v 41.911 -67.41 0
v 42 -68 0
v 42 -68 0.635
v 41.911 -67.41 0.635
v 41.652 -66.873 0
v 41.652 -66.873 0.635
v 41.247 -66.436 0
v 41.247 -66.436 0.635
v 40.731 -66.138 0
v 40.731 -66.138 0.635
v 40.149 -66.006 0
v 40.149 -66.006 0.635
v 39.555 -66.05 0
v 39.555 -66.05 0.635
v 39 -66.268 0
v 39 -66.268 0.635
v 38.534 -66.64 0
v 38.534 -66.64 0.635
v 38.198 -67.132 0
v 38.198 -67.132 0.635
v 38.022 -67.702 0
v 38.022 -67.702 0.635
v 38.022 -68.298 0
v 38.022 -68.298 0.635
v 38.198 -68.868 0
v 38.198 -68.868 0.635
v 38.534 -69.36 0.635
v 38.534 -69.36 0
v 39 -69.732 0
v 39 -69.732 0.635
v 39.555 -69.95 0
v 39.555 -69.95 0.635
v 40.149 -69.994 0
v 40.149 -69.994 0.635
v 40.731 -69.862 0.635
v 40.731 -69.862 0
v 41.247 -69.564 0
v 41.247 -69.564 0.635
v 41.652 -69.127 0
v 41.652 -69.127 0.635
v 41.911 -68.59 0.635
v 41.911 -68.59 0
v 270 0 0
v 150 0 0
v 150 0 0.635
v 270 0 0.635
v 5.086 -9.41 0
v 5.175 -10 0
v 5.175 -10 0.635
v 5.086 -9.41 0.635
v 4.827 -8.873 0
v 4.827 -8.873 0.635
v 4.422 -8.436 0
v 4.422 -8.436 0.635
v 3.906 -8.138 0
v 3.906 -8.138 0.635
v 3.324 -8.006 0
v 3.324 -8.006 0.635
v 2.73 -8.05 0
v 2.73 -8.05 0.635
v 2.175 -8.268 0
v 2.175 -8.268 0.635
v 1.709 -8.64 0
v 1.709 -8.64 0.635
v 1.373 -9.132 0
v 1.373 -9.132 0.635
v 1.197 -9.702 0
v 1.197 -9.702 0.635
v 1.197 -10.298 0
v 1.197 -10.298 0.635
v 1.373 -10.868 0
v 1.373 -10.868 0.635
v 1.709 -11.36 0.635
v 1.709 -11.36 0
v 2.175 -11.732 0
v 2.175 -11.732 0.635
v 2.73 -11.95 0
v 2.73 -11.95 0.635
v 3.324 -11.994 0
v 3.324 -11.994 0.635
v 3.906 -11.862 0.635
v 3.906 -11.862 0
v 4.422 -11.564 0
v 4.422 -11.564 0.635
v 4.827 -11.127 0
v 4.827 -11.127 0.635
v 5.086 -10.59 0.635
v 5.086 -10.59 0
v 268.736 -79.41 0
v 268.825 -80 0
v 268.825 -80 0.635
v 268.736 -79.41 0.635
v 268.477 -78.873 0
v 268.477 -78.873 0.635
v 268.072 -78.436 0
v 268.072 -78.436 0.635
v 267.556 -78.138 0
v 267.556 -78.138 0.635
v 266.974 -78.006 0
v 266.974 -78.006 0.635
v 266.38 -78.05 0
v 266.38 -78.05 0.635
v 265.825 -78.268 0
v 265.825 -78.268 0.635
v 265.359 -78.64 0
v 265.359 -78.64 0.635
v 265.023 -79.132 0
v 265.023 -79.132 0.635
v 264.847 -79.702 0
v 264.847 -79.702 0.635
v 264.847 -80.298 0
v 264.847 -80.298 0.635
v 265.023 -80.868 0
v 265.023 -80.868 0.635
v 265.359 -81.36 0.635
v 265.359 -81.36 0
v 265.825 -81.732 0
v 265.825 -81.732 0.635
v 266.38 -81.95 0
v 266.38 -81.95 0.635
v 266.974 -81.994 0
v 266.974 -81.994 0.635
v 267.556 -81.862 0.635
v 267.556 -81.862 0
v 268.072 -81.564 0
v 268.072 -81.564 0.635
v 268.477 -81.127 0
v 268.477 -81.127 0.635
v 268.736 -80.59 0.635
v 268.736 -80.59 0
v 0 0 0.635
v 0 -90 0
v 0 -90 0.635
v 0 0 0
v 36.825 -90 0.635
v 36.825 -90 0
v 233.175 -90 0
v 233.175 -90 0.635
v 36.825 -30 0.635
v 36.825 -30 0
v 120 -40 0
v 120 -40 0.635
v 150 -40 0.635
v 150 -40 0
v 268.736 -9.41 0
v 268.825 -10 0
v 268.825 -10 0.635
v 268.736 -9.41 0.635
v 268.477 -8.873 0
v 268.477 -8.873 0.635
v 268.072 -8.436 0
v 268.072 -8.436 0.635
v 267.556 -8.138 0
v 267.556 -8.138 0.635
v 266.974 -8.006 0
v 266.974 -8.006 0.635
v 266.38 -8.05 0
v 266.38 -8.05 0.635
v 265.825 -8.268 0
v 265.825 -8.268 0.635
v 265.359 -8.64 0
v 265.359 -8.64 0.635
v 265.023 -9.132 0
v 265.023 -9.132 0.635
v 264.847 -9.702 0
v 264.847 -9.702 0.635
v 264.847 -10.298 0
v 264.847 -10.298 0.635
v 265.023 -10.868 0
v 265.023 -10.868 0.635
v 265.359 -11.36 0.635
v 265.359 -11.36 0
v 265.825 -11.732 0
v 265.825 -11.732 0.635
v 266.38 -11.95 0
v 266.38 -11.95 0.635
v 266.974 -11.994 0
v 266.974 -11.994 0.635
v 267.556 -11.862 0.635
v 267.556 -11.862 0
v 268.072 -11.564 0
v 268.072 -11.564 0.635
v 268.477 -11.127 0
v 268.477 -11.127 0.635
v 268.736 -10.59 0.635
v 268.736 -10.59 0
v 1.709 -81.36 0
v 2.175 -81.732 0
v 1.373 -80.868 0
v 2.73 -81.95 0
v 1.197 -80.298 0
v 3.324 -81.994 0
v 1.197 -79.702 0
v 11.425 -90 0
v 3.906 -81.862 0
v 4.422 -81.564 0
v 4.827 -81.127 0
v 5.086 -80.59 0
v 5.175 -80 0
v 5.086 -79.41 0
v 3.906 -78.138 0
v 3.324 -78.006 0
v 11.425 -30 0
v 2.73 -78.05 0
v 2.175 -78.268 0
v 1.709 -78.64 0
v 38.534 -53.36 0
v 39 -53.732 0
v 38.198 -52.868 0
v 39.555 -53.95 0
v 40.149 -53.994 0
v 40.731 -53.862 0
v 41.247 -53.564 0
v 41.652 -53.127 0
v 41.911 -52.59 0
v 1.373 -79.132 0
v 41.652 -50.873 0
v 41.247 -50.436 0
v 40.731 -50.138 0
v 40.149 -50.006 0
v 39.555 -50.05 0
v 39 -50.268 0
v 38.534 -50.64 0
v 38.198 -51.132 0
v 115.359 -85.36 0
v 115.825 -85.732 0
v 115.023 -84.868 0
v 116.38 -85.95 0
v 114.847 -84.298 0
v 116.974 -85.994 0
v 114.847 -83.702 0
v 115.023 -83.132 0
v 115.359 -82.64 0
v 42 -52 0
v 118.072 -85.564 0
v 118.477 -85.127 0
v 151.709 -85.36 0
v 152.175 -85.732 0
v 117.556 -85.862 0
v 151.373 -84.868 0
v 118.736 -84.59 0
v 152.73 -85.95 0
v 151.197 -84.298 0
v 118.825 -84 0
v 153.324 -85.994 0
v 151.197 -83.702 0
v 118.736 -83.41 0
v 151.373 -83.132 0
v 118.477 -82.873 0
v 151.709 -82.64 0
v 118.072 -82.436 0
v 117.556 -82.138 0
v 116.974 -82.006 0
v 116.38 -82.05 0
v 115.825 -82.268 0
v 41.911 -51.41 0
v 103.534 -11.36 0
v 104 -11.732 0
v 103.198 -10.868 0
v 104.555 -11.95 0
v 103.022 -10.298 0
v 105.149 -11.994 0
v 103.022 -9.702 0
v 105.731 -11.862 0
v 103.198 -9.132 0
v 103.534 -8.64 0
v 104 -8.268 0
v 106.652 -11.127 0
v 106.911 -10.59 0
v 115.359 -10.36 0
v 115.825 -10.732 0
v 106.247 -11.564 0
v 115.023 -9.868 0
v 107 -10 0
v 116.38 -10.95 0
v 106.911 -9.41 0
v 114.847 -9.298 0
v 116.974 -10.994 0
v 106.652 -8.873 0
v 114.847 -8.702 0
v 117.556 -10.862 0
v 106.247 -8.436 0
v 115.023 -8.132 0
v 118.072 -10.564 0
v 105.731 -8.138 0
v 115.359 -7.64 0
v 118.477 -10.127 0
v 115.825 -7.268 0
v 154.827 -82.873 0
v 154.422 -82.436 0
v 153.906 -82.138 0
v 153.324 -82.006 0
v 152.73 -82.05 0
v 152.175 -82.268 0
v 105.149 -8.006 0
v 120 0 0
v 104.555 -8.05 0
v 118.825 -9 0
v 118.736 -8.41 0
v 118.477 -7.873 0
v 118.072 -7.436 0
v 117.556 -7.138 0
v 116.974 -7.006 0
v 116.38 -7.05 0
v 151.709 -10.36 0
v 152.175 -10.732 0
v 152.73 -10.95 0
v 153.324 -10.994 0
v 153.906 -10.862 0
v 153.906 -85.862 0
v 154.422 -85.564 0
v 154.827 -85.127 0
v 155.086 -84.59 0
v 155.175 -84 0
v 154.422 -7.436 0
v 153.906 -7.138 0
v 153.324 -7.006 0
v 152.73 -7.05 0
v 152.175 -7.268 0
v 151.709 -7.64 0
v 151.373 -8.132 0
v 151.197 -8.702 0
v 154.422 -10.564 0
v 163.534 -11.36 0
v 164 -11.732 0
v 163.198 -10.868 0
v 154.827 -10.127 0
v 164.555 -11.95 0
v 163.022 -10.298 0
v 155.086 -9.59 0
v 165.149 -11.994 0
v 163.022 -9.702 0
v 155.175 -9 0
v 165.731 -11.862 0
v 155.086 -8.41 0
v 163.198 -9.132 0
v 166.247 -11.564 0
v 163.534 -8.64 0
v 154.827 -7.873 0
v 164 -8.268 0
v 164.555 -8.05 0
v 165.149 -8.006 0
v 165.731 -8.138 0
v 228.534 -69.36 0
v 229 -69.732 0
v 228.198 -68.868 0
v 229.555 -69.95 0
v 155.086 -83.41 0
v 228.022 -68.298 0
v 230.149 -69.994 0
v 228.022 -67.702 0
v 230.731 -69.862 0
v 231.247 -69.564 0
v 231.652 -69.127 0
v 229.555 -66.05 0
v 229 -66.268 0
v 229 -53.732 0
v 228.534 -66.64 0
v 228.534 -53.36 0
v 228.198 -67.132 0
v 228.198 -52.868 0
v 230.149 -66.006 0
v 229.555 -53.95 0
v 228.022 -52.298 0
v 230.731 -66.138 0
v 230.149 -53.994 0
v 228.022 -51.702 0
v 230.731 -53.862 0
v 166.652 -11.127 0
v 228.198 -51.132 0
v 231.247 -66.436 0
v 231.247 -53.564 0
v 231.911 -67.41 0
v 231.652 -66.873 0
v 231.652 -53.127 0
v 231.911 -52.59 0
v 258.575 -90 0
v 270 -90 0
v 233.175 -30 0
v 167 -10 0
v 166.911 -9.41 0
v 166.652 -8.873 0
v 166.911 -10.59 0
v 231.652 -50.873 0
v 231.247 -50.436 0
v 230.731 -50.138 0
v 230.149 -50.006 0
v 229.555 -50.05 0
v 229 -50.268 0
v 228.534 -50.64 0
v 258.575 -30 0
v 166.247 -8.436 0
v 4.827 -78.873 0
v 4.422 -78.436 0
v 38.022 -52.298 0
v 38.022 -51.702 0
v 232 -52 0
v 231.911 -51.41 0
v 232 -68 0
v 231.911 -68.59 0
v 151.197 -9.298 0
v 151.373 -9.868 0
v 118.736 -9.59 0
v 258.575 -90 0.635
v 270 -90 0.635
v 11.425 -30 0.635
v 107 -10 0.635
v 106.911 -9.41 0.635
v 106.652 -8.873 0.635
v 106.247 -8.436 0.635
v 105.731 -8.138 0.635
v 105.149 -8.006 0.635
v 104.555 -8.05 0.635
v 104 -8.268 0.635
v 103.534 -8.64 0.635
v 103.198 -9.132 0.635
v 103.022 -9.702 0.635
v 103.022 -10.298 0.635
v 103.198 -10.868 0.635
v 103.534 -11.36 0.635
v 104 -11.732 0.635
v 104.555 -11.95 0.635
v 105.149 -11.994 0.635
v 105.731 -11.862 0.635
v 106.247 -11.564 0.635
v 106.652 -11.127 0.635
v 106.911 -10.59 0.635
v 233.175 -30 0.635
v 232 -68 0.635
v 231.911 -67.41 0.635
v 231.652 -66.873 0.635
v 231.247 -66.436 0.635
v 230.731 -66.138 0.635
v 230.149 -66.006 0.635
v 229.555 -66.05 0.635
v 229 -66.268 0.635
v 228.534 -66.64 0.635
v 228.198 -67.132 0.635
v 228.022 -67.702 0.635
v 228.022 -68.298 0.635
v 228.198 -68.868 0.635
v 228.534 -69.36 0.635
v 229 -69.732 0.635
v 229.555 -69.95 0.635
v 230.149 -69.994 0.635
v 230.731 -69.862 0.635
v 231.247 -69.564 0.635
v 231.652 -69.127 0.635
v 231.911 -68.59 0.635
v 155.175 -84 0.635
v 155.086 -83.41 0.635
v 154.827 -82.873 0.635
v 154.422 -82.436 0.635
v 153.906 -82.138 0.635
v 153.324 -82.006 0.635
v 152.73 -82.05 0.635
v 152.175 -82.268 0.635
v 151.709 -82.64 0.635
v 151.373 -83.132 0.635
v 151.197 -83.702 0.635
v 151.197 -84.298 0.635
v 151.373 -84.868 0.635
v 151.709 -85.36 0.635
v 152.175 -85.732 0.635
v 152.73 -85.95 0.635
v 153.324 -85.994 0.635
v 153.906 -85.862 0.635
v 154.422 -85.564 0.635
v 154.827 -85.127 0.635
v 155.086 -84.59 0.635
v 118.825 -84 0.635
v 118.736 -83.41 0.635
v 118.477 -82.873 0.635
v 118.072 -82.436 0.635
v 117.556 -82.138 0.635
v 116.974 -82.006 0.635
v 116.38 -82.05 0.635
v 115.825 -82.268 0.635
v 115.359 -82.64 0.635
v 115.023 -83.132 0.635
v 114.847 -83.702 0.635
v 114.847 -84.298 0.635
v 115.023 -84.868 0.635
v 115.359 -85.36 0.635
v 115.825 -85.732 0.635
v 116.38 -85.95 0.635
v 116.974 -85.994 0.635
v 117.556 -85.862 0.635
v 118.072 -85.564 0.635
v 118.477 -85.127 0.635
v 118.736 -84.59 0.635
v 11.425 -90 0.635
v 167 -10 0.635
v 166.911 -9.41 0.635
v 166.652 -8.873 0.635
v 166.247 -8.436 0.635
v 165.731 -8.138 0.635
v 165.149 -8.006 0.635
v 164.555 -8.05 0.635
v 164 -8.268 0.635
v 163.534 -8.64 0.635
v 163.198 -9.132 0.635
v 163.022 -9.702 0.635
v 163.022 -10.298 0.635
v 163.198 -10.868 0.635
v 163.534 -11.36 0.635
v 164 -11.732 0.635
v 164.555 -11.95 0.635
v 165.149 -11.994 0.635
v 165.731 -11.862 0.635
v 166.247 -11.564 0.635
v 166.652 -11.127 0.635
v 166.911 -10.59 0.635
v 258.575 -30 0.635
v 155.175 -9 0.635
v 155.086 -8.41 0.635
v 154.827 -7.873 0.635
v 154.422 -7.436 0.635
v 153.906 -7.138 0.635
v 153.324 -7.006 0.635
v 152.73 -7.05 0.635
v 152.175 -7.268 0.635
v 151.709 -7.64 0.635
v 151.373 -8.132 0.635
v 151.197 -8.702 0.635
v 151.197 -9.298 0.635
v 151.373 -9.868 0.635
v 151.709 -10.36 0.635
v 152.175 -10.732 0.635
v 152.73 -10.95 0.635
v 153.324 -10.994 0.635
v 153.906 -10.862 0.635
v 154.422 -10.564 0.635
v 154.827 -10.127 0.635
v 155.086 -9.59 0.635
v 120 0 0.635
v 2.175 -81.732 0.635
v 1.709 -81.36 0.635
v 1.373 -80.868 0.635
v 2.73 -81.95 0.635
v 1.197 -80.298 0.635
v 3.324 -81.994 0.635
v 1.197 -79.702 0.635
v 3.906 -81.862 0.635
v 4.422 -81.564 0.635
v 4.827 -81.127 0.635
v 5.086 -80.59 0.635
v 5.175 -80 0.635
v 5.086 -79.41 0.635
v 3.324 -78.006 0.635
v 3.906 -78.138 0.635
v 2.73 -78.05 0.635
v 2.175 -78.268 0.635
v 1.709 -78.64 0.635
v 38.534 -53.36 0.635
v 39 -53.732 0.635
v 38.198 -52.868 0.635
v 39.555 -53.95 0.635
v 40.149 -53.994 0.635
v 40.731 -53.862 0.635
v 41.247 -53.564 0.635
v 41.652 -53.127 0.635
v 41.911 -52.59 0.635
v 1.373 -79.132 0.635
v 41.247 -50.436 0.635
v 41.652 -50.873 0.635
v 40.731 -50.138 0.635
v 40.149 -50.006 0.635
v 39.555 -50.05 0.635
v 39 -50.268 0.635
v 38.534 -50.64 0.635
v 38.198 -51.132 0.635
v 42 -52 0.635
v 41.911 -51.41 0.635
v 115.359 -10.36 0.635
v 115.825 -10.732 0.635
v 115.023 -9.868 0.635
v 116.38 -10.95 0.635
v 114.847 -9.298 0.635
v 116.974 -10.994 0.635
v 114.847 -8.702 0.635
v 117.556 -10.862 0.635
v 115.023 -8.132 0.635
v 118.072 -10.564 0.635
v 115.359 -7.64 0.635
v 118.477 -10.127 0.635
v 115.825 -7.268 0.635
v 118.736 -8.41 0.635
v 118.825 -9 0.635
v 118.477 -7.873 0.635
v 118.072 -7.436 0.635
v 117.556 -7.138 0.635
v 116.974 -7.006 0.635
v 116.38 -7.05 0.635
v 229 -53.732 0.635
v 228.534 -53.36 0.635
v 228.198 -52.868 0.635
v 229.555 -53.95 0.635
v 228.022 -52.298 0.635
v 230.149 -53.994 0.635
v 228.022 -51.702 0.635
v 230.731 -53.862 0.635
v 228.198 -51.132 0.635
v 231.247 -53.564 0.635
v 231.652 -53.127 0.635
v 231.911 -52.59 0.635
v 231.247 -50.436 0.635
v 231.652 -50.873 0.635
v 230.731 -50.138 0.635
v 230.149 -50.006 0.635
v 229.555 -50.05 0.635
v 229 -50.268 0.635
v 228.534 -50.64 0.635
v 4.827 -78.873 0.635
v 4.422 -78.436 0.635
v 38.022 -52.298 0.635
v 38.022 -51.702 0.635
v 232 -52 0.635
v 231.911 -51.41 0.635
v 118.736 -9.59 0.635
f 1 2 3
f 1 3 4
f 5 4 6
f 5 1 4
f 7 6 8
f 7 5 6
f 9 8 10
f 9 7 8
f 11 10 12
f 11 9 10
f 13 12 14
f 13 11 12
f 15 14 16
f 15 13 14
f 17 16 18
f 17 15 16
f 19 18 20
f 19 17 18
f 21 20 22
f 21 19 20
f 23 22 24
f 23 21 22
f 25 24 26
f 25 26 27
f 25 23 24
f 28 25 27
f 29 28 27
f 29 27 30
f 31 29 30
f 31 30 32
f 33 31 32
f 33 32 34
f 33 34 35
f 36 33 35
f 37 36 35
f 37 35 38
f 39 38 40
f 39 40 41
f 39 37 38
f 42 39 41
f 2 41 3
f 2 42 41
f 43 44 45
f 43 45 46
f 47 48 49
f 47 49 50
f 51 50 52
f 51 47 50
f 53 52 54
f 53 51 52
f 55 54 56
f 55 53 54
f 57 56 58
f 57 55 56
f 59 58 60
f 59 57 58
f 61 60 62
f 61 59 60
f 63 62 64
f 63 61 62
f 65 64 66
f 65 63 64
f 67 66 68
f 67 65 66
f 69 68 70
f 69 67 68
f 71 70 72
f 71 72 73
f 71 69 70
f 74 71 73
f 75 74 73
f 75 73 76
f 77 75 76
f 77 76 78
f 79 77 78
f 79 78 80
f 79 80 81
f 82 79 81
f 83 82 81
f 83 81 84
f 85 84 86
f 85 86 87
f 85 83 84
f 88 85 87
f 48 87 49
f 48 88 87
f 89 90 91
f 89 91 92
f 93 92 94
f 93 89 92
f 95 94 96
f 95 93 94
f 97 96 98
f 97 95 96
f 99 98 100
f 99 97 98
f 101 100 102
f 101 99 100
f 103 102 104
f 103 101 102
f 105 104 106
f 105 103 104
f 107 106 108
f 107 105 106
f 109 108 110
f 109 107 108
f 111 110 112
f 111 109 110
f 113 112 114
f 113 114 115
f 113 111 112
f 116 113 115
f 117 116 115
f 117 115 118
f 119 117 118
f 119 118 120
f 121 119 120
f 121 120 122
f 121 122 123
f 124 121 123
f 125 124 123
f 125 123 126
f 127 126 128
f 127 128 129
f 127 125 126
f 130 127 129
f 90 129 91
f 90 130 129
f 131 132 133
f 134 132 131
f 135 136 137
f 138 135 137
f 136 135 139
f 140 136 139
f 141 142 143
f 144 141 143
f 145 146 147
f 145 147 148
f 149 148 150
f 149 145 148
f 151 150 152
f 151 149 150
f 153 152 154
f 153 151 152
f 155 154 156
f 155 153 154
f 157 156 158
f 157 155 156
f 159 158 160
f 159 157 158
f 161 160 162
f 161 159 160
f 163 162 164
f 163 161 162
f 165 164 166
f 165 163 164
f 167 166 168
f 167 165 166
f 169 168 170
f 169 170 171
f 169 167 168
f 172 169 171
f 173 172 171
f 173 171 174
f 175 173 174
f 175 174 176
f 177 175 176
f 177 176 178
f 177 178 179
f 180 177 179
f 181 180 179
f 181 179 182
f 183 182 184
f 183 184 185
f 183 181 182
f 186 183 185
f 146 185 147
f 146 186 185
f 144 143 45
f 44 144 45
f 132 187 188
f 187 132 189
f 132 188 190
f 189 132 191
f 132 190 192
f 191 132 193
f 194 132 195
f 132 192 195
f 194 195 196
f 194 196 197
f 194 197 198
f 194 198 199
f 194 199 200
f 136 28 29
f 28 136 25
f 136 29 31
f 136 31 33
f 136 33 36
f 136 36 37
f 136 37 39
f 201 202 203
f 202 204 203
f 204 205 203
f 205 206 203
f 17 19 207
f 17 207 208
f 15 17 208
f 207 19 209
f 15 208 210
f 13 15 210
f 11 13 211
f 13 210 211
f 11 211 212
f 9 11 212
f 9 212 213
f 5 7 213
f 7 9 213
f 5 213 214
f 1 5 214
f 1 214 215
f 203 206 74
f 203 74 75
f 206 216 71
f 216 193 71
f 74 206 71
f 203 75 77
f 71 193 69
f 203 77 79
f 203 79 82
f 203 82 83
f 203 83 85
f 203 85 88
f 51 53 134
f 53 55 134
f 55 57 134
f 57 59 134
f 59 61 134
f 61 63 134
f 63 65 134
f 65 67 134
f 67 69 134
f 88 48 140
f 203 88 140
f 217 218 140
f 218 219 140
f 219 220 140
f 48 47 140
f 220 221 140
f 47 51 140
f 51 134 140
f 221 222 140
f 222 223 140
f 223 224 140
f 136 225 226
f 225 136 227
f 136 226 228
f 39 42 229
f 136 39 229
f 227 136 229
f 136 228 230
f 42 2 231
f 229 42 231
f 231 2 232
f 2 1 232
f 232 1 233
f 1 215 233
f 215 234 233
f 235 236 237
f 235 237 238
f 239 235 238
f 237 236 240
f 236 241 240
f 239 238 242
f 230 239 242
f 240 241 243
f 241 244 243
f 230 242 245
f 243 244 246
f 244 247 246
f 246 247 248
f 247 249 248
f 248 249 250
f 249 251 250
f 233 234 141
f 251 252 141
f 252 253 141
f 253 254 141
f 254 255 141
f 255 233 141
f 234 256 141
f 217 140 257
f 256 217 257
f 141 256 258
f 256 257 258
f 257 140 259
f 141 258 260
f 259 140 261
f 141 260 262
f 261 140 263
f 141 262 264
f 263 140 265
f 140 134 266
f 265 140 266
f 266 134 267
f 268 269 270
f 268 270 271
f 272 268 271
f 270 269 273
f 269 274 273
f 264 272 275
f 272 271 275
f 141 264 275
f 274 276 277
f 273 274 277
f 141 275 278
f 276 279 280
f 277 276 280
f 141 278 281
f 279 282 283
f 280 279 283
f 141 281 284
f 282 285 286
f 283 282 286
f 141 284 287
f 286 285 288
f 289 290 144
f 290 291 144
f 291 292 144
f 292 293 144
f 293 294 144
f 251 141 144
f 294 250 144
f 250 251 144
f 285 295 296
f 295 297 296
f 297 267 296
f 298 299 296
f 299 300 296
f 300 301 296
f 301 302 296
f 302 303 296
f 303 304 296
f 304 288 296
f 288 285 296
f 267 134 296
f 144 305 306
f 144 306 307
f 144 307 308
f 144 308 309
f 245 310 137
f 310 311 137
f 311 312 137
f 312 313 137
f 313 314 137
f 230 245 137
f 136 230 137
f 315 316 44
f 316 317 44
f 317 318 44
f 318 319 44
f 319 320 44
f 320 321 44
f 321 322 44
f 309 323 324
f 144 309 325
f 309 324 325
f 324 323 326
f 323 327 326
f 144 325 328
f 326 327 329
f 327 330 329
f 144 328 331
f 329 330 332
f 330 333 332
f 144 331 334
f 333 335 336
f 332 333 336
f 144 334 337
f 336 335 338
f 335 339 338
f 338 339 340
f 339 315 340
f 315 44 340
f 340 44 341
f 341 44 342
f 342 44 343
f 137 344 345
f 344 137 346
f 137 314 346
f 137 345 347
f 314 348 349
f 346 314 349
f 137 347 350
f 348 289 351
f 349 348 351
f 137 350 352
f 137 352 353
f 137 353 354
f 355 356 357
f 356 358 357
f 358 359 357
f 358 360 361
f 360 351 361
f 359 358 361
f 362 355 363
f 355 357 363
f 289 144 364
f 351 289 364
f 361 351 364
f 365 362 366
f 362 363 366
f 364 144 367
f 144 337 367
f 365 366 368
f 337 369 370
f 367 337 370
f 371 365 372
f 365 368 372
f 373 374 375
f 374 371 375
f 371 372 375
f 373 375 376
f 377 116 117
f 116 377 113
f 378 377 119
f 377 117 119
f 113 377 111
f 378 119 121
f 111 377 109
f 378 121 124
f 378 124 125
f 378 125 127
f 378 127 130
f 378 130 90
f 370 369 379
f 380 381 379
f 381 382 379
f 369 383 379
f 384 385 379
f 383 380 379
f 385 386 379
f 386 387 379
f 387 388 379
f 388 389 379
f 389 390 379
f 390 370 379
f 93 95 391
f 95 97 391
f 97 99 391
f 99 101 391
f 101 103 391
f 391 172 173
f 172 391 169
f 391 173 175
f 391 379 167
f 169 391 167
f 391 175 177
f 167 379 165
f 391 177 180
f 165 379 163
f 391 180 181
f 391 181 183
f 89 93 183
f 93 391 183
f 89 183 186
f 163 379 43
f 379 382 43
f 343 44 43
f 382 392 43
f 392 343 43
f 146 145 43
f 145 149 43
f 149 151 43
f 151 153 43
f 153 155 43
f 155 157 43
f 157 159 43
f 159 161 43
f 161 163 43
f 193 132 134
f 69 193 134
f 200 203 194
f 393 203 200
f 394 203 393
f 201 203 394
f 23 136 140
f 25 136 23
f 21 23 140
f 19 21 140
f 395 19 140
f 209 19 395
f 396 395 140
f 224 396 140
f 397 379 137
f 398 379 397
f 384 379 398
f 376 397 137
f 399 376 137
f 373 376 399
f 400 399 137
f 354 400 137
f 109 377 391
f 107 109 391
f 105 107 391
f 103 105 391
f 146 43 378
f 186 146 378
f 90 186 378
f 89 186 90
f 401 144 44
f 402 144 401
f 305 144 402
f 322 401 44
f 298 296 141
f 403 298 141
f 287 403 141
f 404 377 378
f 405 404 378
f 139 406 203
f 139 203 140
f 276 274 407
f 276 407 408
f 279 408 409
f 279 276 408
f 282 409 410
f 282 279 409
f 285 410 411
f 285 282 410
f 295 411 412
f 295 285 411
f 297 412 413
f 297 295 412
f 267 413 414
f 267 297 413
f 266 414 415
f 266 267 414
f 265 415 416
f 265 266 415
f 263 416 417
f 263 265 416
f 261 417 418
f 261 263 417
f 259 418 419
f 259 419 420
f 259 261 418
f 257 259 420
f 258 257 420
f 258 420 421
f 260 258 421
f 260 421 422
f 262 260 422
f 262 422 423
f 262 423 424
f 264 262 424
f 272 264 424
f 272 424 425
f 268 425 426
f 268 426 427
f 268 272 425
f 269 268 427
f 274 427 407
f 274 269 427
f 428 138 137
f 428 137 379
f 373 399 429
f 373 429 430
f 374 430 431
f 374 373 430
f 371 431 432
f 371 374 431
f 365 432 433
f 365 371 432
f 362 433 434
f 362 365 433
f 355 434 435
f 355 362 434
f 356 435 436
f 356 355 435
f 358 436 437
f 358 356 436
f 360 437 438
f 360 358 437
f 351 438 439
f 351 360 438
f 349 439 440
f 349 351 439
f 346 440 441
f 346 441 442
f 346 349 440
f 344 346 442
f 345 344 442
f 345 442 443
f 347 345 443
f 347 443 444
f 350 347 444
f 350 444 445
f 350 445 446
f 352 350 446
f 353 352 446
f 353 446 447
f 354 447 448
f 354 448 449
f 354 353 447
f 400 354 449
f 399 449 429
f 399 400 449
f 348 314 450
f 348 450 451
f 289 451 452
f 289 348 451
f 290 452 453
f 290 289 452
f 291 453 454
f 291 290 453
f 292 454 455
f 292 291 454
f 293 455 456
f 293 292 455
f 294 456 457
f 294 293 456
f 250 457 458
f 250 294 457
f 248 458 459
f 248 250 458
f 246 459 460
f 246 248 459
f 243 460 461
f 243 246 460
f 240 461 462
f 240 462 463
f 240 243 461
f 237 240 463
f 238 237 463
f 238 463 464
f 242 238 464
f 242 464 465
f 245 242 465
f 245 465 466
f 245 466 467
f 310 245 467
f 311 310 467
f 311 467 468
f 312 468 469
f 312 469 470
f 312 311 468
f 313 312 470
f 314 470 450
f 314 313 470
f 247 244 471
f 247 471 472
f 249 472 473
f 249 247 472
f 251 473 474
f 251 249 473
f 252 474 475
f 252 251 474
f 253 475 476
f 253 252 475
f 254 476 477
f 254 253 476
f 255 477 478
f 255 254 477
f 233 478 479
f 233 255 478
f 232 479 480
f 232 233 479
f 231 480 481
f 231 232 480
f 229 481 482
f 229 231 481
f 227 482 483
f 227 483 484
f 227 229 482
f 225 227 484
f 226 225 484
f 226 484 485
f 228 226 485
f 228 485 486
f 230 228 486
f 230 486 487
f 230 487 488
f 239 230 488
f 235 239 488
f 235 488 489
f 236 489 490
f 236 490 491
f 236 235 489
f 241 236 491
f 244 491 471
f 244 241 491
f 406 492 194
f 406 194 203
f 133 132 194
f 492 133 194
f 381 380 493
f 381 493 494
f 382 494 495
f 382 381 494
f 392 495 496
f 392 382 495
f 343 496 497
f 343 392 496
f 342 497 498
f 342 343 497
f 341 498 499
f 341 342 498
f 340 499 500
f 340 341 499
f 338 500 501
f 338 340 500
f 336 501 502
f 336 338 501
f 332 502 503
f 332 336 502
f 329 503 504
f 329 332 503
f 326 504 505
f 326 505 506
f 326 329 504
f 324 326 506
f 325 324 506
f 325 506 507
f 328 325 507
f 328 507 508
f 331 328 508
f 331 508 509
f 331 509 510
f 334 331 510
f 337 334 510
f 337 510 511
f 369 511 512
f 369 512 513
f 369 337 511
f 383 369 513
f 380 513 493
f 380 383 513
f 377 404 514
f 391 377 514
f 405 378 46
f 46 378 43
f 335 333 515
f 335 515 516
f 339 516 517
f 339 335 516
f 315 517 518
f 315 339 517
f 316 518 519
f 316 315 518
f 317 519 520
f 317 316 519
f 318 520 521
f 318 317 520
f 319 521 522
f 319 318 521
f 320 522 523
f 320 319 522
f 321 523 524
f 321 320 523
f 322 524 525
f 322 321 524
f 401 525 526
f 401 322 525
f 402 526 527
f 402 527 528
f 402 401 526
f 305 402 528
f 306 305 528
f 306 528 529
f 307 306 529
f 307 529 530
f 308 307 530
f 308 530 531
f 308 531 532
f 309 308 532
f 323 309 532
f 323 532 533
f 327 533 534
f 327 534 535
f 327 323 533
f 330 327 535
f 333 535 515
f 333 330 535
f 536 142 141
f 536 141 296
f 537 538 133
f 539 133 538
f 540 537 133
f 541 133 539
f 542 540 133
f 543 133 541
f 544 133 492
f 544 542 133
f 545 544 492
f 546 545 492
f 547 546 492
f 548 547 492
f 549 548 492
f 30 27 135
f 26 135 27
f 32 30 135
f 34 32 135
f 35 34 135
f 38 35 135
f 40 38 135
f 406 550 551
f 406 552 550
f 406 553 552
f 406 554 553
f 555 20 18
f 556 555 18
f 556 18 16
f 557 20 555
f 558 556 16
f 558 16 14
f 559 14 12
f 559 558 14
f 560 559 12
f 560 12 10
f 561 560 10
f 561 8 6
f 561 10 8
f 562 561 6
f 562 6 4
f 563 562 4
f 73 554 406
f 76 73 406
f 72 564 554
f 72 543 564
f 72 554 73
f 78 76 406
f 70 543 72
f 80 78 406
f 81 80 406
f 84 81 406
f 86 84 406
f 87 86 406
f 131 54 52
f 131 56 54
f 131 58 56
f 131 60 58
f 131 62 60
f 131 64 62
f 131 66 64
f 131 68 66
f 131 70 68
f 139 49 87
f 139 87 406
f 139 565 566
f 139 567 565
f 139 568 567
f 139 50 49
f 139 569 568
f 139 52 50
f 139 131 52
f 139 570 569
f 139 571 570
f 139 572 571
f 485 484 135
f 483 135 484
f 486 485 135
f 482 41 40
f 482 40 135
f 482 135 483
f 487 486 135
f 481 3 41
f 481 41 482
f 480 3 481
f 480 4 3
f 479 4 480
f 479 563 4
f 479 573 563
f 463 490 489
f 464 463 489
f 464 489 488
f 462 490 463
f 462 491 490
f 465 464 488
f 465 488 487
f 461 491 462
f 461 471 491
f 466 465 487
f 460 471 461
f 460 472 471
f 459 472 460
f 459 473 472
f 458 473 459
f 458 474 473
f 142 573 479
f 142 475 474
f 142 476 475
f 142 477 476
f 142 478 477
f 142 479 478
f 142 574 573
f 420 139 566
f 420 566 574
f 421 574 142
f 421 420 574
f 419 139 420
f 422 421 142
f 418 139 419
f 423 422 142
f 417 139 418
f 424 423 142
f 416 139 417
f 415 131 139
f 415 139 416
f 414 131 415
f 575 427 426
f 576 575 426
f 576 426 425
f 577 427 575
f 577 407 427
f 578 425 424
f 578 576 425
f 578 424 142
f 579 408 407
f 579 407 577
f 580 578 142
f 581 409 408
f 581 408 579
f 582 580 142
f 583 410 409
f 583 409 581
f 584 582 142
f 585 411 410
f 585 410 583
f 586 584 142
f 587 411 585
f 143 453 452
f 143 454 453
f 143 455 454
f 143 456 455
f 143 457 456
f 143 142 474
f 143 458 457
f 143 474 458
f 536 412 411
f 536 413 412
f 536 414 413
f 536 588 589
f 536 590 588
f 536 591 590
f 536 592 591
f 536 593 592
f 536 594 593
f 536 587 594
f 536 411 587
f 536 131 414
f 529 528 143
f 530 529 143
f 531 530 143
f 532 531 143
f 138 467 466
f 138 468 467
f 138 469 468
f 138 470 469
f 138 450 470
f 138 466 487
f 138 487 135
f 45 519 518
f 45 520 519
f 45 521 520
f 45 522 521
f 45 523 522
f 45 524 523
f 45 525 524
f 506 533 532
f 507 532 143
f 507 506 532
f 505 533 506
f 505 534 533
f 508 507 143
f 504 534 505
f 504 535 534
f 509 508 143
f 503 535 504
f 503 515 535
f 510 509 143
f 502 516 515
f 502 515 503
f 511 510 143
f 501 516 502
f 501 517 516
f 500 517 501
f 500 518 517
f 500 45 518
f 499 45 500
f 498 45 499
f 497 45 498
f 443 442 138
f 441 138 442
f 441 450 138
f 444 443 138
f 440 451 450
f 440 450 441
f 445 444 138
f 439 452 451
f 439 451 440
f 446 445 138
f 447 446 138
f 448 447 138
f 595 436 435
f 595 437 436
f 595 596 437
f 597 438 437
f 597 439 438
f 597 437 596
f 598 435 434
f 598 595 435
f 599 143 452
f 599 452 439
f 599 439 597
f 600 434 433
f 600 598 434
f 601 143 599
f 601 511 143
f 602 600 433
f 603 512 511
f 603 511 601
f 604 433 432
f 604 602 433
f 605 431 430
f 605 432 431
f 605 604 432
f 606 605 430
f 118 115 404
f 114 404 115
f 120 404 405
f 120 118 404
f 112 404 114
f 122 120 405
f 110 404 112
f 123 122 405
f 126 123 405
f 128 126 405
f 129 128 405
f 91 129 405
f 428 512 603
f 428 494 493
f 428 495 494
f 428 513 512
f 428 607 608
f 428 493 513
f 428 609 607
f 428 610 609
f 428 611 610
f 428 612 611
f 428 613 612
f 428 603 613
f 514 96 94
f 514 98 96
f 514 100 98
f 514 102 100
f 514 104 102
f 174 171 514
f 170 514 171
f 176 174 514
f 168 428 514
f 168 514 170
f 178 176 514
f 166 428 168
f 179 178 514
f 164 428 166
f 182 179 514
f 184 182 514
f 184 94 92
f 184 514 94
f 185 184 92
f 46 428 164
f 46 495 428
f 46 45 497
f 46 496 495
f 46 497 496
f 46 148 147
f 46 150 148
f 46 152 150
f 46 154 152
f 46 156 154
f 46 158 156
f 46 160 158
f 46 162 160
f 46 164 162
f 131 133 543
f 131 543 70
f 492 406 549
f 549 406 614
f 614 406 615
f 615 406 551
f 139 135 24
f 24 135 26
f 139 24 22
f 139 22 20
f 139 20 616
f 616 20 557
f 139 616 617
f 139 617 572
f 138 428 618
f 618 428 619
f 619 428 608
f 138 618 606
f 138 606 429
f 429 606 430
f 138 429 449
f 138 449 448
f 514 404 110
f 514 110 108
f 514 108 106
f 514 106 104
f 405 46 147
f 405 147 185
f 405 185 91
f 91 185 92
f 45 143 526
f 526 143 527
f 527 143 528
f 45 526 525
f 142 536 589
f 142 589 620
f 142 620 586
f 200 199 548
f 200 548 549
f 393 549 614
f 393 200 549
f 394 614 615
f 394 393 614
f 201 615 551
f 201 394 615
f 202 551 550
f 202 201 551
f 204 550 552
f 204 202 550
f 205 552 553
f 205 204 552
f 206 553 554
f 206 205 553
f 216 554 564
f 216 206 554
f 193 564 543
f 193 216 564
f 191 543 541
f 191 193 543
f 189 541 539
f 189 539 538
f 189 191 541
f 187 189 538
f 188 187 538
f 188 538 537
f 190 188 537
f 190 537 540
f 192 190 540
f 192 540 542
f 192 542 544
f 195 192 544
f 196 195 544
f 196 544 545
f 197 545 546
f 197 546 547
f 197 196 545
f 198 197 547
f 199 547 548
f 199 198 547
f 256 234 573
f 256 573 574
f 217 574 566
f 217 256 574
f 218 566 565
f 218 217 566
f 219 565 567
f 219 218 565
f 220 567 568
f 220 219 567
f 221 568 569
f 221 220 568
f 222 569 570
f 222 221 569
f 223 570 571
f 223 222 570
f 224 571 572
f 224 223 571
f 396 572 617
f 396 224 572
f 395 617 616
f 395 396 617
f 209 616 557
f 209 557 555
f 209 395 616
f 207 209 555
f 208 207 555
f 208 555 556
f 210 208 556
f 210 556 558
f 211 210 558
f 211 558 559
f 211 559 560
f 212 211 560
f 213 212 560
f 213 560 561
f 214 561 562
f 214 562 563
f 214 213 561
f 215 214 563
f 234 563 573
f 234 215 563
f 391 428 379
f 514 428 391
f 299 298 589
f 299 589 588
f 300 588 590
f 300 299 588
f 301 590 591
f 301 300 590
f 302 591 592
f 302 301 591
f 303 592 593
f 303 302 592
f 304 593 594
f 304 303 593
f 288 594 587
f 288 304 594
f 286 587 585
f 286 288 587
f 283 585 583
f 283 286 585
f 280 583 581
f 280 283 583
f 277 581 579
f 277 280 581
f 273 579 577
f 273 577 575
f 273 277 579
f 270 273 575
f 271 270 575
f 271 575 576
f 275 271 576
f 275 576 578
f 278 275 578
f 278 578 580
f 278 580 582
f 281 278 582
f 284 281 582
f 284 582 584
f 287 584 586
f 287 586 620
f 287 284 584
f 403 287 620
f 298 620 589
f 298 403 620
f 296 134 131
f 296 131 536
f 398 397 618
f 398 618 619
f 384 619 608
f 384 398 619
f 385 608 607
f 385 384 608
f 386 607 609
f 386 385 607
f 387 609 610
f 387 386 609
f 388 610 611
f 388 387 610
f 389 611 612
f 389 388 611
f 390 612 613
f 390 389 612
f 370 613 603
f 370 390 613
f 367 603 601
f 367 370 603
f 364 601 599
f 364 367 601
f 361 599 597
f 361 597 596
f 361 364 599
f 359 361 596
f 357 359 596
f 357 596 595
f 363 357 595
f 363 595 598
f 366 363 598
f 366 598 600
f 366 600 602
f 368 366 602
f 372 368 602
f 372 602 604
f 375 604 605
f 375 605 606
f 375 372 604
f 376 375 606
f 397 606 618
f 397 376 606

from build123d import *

# Parameters (mm, degrees)
F0_W     = 270
F0_H     = 90
F0_R     = 2
F1_DEPTH = 0.635
F2_W     = 30
F2_H     = 40
F2_W_2   = 25.4
F2_H_2   = 60
F3_DEPTH = 0.636


with BuildPart() as f1:
    # F0 (on Top) → F1 (new body)
    with BuildSketch(Plane.XY):
        with Locations((135, -45)):
            Rectangle(F0_W, F0_H)
        with Locations((3.175, -80)):
            Circle(F0_R, mode=Mode.SUBTRACT)
        with Locations((40, -68)):
            Circle(F0_R, mode=Mode.SUBTRACT)
        with Locations((116.825, -84)):
            Circle(F0_R, mode=Mode.SUBTRACT)
        with Locations((40, -52)):
            Circle(F0_R, mode=Mode.SUBTRACT)
        with Locations((153.175, -84)):
            Circle(F0_R, mode=Mode.SUBTRACT)
        with Locations((266.825, -80)):
            Circle(F0_R, mode=Mode.SUBTRACT)
        with Locations((230, -68)):
            Circle(F0_R, mode=Mode.SUBTRACT)
        with Locations((230, -52)):
            Circle(F0_R, mode=Mode.SUBTRACT)
        with Locations((3.175, -10)):
            Circle(F0_R, mode=Mode.SUBTRACT)
        with Locations((105, -10)):
            Circle(F0_R, mode=Mode.SUBTRACT)
        with Locations((116.825, -9)):
            Circle(F0_R, mode=Mode.SUBTRACT)
        with Locations((153.175, -9)):
            Circle(F0_R, mode=Mode.SUBTRACT)
        with Locations((165, -10)):
            Circle(F0_R, mode=Mode.SUBTRACT)
        with Locations((266.825, -10)):
            Circle(F0_R, mode=Mode.SUBTRACT)
    extrude(amount=F1_DEPTH)

    # F2 (on face) → F3 (cut, through all)
    with BuildSketch(Plane.XY.offset(0.635)):
        with Locations((135, -20)):
            Rectangle(F2_W, F2_H)
        with Locations((24.125, -60)):
            Rectangle(F2_W_2, F2_H_2)
        with Locations((245.875, -60)):
            Rectangle(F2_W_2, F2_H_2)
    extrude(amount=-F3_DEPTH, mode=Mode.SUBTRACT)


solid = f1.part
